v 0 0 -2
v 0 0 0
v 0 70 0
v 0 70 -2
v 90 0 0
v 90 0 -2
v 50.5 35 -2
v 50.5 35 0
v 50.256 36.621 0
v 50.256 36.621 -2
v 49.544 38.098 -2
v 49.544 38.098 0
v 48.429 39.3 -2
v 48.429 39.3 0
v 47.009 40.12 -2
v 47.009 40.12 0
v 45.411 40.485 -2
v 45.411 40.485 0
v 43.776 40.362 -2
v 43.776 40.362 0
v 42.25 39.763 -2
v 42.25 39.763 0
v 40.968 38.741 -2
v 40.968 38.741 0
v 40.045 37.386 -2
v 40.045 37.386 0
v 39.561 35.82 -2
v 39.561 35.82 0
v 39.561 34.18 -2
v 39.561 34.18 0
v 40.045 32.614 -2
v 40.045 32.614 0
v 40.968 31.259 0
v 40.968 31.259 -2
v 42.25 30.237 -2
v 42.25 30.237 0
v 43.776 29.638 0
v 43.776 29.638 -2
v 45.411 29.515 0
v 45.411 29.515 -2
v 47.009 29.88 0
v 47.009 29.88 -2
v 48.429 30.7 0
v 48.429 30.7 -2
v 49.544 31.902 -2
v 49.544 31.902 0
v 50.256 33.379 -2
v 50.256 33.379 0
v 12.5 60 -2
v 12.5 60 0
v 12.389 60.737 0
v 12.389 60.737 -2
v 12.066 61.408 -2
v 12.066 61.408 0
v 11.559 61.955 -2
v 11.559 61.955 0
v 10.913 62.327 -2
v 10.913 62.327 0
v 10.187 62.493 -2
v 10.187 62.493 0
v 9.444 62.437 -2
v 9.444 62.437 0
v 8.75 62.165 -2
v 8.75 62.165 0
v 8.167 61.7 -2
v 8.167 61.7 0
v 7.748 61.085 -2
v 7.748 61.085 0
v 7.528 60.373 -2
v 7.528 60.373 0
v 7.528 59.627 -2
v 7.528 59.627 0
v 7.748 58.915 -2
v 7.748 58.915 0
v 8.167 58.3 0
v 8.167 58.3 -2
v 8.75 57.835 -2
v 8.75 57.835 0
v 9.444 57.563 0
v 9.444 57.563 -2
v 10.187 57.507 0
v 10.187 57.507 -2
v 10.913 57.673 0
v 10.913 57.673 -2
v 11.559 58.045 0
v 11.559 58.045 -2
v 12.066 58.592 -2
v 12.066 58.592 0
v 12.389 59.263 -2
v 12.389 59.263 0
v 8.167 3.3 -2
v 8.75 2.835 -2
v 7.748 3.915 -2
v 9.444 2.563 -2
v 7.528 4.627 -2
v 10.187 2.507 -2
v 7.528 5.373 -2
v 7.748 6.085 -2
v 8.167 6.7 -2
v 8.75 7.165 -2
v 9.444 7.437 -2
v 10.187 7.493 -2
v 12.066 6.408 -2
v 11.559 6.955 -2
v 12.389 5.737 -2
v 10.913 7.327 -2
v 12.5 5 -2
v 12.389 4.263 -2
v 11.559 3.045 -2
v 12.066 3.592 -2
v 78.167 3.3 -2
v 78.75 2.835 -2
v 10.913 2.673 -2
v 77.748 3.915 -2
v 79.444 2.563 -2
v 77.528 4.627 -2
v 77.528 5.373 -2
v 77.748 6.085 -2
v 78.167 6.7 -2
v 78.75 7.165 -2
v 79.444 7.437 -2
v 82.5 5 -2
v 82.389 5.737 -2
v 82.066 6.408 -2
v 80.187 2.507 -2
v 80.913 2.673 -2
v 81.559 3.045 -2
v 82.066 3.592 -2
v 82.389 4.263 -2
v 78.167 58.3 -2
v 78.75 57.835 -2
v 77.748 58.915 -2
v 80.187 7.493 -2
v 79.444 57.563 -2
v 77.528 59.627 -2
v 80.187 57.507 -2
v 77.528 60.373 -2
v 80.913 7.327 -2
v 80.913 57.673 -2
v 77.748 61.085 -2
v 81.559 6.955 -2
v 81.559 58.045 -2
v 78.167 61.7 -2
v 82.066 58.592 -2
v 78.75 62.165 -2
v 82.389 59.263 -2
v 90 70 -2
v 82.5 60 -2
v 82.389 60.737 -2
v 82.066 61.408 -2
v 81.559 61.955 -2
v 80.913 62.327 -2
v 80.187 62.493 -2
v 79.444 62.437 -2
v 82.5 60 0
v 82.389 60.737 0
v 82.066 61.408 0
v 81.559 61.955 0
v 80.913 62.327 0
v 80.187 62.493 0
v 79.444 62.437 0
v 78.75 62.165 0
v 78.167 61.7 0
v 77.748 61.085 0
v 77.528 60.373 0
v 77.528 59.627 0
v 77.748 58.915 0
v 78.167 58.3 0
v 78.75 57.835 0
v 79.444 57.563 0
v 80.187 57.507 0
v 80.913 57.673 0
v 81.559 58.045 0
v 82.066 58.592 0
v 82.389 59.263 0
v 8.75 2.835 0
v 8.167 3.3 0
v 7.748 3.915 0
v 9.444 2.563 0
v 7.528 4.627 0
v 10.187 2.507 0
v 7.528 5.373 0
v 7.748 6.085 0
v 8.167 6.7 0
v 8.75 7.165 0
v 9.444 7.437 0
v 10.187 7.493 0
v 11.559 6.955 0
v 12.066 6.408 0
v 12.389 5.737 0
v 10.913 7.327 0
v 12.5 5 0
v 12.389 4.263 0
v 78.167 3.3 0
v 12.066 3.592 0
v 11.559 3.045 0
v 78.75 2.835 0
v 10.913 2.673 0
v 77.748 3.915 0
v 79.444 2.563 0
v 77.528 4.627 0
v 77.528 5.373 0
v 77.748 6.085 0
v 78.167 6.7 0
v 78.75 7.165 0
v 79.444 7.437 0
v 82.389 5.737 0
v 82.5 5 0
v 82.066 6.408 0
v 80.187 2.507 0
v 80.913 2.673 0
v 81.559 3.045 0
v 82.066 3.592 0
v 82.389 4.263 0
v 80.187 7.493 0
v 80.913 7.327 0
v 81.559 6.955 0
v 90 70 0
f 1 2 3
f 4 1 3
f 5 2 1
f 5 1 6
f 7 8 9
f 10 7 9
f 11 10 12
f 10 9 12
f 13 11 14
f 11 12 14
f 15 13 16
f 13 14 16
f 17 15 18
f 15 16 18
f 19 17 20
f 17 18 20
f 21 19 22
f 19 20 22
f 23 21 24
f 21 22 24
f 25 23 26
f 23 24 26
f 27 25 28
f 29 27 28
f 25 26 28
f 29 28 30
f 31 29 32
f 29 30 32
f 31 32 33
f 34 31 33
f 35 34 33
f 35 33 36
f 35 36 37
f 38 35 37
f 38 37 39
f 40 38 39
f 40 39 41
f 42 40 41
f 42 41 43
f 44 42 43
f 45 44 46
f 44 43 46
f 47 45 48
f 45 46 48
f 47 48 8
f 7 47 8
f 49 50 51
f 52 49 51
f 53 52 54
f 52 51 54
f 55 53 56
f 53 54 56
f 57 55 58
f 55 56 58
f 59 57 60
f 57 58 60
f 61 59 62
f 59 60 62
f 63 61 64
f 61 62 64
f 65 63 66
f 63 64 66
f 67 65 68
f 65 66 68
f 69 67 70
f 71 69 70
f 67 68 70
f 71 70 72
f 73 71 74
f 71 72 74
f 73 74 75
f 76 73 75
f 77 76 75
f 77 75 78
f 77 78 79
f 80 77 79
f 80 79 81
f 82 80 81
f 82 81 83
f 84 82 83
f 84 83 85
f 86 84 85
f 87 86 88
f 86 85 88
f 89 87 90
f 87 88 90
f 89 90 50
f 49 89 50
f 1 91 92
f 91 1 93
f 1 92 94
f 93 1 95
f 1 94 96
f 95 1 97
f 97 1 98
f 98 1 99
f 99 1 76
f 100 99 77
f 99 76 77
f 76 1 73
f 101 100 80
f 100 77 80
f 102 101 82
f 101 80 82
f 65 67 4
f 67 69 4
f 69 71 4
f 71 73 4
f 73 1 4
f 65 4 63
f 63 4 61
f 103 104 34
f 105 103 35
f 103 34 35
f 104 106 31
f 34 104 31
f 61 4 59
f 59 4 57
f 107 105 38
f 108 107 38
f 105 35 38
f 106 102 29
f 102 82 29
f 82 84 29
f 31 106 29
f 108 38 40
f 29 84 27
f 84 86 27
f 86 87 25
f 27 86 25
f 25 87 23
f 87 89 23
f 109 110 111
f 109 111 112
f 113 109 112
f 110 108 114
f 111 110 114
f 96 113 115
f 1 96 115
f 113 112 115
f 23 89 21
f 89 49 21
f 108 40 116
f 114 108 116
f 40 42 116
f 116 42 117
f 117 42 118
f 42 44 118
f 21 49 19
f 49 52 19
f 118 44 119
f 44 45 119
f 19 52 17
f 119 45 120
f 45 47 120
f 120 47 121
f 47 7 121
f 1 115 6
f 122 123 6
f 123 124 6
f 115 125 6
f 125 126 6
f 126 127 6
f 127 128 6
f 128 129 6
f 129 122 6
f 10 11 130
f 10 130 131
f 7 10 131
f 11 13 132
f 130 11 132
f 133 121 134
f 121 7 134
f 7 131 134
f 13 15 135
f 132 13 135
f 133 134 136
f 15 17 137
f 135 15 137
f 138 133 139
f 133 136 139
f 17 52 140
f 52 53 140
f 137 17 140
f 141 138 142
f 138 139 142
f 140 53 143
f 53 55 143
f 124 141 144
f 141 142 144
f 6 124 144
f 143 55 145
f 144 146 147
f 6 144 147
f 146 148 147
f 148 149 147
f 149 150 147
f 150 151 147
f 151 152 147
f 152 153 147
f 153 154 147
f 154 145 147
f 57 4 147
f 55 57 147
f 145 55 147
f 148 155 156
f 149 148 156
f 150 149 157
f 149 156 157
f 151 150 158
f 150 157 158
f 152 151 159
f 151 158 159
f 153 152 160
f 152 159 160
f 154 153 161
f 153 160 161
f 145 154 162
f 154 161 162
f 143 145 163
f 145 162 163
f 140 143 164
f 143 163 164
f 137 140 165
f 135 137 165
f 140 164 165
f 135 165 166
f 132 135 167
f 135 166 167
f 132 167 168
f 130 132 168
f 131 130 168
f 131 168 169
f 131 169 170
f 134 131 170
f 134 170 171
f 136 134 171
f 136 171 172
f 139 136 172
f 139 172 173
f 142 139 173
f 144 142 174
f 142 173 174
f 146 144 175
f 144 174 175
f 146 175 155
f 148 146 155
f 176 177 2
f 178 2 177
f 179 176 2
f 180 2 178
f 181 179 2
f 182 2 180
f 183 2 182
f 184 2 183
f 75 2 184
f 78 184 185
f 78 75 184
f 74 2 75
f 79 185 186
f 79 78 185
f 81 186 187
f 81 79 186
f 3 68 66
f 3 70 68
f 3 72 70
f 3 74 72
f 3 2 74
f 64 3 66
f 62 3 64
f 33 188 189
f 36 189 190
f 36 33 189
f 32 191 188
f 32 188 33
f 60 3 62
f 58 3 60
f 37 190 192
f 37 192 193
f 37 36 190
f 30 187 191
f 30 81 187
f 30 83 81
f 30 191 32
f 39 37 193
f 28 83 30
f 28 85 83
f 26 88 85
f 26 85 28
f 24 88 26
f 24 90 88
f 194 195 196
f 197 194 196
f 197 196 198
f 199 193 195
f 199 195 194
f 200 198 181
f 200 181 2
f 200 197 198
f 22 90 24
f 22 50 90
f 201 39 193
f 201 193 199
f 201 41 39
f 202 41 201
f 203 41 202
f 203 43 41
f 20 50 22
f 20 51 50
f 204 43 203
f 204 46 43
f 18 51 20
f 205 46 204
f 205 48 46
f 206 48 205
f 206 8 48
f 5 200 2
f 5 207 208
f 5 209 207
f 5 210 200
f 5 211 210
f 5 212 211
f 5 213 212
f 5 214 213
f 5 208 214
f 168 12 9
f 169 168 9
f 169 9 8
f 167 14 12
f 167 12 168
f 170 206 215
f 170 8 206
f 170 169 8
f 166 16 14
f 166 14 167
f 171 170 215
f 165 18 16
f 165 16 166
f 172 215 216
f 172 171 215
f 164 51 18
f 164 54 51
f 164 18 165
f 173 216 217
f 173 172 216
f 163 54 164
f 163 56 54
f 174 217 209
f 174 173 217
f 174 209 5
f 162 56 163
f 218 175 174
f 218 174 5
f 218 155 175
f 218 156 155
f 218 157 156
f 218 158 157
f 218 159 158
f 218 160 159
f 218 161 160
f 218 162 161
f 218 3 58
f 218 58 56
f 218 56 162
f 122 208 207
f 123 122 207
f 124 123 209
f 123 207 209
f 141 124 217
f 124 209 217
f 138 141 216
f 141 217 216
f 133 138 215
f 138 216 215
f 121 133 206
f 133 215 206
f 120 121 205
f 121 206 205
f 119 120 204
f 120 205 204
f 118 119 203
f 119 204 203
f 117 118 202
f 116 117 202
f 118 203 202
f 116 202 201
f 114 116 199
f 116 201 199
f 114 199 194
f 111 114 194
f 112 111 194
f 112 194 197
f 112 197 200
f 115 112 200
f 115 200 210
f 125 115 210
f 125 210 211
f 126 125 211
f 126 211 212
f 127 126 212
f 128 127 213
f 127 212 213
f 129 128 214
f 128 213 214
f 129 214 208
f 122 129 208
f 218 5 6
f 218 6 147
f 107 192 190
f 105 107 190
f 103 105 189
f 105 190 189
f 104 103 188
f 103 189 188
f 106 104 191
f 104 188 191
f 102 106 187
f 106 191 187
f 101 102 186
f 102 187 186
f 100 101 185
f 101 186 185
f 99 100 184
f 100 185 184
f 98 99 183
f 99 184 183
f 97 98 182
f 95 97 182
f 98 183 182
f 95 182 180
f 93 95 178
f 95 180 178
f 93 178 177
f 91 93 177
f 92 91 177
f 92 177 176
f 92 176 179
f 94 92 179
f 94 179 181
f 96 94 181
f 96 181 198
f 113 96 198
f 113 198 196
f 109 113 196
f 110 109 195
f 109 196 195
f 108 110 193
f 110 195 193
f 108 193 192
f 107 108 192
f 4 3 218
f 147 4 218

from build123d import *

# Parameters (mm, degrees)
SKETCH_1_W             = 90
SKETCH_1_H             = 70
SKETCH_1_R             = 5.5
SKETCH_1_R_2           = 2.5
SM_BASE_FLANGE_1_DEPTH = 2


# Sheet-metal steps are written as plain solids
with BuildPart() as part:
    # Sketch 1 → Базовая кромка1 (new body)
    with BuildSketch(Plane.XY):
        with Locations((45, 35)):
            Rectangle(SKETCH_1_W, SKETCH_1_H)
        with Locations((45, 35)):
            Circle(SKETCH_1_R, mode=Mode.SUBTRACT)
        with Locations((10, 60)):
            Circle(SKETCH_1_R_2, mode=Mode.SUBTRACT)
        with Locations((80, 60)):
            Circle(SKETCH_1_R_2, mode=Mode.SUBTRACT)
        with Locations((10, 5)):
            Circle(SKETCH_1_R_2, mode=Mode.SUBTRACT)
        with Locations((80, 5)):
            Circle(SKETCH_1_R_2, mode=Mode.SUBTRACT)
    extrude(amount=-SM_BASE_FLANGE_1_DEPTH)


solid = part.part
